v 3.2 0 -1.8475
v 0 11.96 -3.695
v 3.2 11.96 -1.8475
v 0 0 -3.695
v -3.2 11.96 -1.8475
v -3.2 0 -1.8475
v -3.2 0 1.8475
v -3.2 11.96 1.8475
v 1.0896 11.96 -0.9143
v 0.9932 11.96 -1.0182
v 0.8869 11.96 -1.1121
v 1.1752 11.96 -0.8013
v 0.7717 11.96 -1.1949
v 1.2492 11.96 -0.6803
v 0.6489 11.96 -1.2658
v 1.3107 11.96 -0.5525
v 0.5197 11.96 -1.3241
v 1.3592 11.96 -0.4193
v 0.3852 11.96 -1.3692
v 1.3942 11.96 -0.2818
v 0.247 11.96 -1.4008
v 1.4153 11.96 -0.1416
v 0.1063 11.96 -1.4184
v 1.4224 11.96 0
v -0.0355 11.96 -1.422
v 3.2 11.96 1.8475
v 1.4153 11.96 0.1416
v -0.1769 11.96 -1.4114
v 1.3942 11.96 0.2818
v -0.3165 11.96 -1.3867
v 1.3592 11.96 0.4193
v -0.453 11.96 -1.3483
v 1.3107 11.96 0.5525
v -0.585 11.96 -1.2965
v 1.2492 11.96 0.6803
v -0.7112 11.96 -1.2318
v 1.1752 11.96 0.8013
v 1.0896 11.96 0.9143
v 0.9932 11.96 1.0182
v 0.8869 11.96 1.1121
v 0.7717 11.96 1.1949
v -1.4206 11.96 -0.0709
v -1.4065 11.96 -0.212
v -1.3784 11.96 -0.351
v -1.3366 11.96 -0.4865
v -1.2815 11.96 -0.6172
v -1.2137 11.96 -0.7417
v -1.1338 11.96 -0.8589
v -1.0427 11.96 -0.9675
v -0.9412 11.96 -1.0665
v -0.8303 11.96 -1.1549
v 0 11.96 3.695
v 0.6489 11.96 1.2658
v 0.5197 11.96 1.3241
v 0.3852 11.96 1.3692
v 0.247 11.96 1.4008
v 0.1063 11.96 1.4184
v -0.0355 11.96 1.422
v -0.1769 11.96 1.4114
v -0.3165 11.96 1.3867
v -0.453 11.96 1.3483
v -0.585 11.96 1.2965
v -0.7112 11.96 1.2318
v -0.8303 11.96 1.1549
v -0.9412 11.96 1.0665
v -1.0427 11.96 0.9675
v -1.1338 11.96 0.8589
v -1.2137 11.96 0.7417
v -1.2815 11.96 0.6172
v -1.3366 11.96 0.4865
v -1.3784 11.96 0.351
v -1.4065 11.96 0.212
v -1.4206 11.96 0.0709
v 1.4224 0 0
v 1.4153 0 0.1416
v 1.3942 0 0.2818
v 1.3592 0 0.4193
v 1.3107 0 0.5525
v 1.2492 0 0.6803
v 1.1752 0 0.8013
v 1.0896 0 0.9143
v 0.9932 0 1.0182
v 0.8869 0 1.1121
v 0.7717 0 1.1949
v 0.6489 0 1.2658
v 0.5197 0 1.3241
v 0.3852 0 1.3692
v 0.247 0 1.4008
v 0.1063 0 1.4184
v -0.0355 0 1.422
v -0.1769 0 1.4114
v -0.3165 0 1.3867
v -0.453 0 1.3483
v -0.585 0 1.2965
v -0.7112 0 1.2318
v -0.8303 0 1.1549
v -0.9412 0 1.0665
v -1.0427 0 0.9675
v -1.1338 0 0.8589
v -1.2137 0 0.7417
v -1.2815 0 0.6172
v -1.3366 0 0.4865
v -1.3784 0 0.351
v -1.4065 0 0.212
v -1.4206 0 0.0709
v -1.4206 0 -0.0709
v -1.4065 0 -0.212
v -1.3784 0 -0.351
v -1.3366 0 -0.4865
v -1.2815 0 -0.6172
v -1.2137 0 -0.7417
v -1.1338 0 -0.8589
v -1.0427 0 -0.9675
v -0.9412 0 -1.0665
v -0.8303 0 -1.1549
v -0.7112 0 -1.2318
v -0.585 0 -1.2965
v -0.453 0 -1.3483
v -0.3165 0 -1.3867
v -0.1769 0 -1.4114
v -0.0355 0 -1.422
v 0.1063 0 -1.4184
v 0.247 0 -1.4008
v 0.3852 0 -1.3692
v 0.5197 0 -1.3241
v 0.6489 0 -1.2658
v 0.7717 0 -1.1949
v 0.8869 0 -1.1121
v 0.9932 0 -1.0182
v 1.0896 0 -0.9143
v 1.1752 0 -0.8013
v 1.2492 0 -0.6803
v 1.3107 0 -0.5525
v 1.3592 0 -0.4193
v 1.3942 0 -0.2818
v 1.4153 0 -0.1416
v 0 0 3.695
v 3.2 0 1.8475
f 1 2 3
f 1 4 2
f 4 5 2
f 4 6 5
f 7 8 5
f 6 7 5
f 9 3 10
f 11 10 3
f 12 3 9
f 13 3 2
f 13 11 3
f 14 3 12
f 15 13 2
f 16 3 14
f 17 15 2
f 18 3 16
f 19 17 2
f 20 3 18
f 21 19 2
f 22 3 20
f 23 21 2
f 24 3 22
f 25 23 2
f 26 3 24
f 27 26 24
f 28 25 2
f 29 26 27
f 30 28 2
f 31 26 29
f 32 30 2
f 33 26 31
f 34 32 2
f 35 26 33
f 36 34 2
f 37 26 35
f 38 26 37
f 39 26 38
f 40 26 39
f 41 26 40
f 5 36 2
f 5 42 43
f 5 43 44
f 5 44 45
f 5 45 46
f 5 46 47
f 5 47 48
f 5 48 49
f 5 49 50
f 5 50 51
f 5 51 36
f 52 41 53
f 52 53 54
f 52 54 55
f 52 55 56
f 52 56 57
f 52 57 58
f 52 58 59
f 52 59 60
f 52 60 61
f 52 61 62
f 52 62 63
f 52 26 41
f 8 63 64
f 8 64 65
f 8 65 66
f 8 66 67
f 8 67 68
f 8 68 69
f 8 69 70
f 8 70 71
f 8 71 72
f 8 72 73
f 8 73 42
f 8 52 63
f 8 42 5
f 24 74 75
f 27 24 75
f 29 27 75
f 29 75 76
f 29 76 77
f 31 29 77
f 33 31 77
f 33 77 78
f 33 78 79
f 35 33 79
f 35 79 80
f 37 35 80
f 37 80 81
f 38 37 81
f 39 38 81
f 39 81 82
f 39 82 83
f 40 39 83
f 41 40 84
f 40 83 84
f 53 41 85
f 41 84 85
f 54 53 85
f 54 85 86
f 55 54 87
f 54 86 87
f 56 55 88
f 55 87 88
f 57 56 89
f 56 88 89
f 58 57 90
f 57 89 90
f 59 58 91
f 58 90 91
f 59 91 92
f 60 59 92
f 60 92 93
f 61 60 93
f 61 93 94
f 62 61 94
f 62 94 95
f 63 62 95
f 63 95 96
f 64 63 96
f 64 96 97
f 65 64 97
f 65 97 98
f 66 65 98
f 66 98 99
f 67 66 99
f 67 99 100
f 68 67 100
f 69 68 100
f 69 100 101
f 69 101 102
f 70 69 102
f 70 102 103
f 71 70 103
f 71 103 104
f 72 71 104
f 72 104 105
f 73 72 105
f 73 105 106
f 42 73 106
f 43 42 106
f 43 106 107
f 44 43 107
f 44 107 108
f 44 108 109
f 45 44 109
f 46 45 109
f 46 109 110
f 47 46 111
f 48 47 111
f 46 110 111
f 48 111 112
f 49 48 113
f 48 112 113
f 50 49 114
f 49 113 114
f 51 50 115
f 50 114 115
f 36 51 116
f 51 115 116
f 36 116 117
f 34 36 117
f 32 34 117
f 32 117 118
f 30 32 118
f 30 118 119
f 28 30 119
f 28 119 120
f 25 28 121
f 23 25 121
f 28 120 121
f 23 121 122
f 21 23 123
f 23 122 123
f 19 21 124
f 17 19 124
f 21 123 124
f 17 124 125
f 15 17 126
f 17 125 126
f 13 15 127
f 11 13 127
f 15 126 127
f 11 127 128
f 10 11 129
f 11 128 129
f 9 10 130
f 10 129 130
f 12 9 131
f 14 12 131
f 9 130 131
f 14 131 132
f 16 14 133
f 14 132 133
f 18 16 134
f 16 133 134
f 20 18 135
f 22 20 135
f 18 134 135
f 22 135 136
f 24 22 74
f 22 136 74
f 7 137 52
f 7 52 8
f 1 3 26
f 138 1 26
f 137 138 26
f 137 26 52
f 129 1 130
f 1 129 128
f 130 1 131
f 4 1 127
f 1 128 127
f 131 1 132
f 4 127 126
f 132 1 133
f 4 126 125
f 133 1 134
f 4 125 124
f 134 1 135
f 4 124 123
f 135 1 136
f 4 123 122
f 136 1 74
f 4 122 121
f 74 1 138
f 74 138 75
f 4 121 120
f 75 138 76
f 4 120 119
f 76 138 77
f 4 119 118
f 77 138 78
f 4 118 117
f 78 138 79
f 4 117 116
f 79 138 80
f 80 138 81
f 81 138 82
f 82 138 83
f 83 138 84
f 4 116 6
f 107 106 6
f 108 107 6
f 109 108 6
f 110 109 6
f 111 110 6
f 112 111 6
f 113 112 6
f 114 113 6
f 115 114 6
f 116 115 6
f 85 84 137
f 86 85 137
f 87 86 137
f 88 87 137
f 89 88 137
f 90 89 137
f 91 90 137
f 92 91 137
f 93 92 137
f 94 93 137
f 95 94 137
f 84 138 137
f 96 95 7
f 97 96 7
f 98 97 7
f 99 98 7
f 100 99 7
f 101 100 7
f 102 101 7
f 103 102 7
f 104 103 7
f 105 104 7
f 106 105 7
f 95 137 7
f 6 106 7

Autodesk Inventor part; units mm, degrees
ref_plane "YZ Plane" through (0, 0, 0) normal (1, 0, 0) x (0, 1, 0)
ref_plane "XZ Plane" through (0, 0, 0) normal (0, 1, 0) x (-1, 0, 0)
ref_plane "XY Plane" through (0, 0, 0) normal (0, 0, 1) x (1, 0, 0)
sketch "Sketch1" plane through (0, 0, 0) normal (0, 1, 0) x (-1, 0, 0)
  line L0 (3.2, 1.8475) -> (3.2, -1.8475)
  line L1 (3.2, -1.8475) -> (0, -3.695)
  line L2 (0, -3.695) -> (-3.2, -1.8475)
  line L3 (-3.2, -1.8475) -> (-3.2, 1.8475)
  line L4 (-3.2, 1.8475) -> (0, 3.695)
  line L5 (0, 3.695) -> (3.2, 1.8475)
  point P0 (0, 0)
  point P1 (3.2, 0)
  point P2 (-3.2, 0)
  dimension "d0" = 6.4
  dimension "d1" = 120
  dimension "d2" = 6.4
extrude "Extrusion1" add sketch "Sketch1" along normal blind 11.96
sketch "Sketch3" plane through (0, 0, 0) normal (0, -1, 0) x (1, 0, 0)
  circle A0 centre (0, 0) radius 1.4224
  dimension "d8" = 2.8448
extrude "Extrusion3" cut sketch "Sketch3" against normal through all
properties part number "pc104standoffTEMP2" material "Stainless Steel"
